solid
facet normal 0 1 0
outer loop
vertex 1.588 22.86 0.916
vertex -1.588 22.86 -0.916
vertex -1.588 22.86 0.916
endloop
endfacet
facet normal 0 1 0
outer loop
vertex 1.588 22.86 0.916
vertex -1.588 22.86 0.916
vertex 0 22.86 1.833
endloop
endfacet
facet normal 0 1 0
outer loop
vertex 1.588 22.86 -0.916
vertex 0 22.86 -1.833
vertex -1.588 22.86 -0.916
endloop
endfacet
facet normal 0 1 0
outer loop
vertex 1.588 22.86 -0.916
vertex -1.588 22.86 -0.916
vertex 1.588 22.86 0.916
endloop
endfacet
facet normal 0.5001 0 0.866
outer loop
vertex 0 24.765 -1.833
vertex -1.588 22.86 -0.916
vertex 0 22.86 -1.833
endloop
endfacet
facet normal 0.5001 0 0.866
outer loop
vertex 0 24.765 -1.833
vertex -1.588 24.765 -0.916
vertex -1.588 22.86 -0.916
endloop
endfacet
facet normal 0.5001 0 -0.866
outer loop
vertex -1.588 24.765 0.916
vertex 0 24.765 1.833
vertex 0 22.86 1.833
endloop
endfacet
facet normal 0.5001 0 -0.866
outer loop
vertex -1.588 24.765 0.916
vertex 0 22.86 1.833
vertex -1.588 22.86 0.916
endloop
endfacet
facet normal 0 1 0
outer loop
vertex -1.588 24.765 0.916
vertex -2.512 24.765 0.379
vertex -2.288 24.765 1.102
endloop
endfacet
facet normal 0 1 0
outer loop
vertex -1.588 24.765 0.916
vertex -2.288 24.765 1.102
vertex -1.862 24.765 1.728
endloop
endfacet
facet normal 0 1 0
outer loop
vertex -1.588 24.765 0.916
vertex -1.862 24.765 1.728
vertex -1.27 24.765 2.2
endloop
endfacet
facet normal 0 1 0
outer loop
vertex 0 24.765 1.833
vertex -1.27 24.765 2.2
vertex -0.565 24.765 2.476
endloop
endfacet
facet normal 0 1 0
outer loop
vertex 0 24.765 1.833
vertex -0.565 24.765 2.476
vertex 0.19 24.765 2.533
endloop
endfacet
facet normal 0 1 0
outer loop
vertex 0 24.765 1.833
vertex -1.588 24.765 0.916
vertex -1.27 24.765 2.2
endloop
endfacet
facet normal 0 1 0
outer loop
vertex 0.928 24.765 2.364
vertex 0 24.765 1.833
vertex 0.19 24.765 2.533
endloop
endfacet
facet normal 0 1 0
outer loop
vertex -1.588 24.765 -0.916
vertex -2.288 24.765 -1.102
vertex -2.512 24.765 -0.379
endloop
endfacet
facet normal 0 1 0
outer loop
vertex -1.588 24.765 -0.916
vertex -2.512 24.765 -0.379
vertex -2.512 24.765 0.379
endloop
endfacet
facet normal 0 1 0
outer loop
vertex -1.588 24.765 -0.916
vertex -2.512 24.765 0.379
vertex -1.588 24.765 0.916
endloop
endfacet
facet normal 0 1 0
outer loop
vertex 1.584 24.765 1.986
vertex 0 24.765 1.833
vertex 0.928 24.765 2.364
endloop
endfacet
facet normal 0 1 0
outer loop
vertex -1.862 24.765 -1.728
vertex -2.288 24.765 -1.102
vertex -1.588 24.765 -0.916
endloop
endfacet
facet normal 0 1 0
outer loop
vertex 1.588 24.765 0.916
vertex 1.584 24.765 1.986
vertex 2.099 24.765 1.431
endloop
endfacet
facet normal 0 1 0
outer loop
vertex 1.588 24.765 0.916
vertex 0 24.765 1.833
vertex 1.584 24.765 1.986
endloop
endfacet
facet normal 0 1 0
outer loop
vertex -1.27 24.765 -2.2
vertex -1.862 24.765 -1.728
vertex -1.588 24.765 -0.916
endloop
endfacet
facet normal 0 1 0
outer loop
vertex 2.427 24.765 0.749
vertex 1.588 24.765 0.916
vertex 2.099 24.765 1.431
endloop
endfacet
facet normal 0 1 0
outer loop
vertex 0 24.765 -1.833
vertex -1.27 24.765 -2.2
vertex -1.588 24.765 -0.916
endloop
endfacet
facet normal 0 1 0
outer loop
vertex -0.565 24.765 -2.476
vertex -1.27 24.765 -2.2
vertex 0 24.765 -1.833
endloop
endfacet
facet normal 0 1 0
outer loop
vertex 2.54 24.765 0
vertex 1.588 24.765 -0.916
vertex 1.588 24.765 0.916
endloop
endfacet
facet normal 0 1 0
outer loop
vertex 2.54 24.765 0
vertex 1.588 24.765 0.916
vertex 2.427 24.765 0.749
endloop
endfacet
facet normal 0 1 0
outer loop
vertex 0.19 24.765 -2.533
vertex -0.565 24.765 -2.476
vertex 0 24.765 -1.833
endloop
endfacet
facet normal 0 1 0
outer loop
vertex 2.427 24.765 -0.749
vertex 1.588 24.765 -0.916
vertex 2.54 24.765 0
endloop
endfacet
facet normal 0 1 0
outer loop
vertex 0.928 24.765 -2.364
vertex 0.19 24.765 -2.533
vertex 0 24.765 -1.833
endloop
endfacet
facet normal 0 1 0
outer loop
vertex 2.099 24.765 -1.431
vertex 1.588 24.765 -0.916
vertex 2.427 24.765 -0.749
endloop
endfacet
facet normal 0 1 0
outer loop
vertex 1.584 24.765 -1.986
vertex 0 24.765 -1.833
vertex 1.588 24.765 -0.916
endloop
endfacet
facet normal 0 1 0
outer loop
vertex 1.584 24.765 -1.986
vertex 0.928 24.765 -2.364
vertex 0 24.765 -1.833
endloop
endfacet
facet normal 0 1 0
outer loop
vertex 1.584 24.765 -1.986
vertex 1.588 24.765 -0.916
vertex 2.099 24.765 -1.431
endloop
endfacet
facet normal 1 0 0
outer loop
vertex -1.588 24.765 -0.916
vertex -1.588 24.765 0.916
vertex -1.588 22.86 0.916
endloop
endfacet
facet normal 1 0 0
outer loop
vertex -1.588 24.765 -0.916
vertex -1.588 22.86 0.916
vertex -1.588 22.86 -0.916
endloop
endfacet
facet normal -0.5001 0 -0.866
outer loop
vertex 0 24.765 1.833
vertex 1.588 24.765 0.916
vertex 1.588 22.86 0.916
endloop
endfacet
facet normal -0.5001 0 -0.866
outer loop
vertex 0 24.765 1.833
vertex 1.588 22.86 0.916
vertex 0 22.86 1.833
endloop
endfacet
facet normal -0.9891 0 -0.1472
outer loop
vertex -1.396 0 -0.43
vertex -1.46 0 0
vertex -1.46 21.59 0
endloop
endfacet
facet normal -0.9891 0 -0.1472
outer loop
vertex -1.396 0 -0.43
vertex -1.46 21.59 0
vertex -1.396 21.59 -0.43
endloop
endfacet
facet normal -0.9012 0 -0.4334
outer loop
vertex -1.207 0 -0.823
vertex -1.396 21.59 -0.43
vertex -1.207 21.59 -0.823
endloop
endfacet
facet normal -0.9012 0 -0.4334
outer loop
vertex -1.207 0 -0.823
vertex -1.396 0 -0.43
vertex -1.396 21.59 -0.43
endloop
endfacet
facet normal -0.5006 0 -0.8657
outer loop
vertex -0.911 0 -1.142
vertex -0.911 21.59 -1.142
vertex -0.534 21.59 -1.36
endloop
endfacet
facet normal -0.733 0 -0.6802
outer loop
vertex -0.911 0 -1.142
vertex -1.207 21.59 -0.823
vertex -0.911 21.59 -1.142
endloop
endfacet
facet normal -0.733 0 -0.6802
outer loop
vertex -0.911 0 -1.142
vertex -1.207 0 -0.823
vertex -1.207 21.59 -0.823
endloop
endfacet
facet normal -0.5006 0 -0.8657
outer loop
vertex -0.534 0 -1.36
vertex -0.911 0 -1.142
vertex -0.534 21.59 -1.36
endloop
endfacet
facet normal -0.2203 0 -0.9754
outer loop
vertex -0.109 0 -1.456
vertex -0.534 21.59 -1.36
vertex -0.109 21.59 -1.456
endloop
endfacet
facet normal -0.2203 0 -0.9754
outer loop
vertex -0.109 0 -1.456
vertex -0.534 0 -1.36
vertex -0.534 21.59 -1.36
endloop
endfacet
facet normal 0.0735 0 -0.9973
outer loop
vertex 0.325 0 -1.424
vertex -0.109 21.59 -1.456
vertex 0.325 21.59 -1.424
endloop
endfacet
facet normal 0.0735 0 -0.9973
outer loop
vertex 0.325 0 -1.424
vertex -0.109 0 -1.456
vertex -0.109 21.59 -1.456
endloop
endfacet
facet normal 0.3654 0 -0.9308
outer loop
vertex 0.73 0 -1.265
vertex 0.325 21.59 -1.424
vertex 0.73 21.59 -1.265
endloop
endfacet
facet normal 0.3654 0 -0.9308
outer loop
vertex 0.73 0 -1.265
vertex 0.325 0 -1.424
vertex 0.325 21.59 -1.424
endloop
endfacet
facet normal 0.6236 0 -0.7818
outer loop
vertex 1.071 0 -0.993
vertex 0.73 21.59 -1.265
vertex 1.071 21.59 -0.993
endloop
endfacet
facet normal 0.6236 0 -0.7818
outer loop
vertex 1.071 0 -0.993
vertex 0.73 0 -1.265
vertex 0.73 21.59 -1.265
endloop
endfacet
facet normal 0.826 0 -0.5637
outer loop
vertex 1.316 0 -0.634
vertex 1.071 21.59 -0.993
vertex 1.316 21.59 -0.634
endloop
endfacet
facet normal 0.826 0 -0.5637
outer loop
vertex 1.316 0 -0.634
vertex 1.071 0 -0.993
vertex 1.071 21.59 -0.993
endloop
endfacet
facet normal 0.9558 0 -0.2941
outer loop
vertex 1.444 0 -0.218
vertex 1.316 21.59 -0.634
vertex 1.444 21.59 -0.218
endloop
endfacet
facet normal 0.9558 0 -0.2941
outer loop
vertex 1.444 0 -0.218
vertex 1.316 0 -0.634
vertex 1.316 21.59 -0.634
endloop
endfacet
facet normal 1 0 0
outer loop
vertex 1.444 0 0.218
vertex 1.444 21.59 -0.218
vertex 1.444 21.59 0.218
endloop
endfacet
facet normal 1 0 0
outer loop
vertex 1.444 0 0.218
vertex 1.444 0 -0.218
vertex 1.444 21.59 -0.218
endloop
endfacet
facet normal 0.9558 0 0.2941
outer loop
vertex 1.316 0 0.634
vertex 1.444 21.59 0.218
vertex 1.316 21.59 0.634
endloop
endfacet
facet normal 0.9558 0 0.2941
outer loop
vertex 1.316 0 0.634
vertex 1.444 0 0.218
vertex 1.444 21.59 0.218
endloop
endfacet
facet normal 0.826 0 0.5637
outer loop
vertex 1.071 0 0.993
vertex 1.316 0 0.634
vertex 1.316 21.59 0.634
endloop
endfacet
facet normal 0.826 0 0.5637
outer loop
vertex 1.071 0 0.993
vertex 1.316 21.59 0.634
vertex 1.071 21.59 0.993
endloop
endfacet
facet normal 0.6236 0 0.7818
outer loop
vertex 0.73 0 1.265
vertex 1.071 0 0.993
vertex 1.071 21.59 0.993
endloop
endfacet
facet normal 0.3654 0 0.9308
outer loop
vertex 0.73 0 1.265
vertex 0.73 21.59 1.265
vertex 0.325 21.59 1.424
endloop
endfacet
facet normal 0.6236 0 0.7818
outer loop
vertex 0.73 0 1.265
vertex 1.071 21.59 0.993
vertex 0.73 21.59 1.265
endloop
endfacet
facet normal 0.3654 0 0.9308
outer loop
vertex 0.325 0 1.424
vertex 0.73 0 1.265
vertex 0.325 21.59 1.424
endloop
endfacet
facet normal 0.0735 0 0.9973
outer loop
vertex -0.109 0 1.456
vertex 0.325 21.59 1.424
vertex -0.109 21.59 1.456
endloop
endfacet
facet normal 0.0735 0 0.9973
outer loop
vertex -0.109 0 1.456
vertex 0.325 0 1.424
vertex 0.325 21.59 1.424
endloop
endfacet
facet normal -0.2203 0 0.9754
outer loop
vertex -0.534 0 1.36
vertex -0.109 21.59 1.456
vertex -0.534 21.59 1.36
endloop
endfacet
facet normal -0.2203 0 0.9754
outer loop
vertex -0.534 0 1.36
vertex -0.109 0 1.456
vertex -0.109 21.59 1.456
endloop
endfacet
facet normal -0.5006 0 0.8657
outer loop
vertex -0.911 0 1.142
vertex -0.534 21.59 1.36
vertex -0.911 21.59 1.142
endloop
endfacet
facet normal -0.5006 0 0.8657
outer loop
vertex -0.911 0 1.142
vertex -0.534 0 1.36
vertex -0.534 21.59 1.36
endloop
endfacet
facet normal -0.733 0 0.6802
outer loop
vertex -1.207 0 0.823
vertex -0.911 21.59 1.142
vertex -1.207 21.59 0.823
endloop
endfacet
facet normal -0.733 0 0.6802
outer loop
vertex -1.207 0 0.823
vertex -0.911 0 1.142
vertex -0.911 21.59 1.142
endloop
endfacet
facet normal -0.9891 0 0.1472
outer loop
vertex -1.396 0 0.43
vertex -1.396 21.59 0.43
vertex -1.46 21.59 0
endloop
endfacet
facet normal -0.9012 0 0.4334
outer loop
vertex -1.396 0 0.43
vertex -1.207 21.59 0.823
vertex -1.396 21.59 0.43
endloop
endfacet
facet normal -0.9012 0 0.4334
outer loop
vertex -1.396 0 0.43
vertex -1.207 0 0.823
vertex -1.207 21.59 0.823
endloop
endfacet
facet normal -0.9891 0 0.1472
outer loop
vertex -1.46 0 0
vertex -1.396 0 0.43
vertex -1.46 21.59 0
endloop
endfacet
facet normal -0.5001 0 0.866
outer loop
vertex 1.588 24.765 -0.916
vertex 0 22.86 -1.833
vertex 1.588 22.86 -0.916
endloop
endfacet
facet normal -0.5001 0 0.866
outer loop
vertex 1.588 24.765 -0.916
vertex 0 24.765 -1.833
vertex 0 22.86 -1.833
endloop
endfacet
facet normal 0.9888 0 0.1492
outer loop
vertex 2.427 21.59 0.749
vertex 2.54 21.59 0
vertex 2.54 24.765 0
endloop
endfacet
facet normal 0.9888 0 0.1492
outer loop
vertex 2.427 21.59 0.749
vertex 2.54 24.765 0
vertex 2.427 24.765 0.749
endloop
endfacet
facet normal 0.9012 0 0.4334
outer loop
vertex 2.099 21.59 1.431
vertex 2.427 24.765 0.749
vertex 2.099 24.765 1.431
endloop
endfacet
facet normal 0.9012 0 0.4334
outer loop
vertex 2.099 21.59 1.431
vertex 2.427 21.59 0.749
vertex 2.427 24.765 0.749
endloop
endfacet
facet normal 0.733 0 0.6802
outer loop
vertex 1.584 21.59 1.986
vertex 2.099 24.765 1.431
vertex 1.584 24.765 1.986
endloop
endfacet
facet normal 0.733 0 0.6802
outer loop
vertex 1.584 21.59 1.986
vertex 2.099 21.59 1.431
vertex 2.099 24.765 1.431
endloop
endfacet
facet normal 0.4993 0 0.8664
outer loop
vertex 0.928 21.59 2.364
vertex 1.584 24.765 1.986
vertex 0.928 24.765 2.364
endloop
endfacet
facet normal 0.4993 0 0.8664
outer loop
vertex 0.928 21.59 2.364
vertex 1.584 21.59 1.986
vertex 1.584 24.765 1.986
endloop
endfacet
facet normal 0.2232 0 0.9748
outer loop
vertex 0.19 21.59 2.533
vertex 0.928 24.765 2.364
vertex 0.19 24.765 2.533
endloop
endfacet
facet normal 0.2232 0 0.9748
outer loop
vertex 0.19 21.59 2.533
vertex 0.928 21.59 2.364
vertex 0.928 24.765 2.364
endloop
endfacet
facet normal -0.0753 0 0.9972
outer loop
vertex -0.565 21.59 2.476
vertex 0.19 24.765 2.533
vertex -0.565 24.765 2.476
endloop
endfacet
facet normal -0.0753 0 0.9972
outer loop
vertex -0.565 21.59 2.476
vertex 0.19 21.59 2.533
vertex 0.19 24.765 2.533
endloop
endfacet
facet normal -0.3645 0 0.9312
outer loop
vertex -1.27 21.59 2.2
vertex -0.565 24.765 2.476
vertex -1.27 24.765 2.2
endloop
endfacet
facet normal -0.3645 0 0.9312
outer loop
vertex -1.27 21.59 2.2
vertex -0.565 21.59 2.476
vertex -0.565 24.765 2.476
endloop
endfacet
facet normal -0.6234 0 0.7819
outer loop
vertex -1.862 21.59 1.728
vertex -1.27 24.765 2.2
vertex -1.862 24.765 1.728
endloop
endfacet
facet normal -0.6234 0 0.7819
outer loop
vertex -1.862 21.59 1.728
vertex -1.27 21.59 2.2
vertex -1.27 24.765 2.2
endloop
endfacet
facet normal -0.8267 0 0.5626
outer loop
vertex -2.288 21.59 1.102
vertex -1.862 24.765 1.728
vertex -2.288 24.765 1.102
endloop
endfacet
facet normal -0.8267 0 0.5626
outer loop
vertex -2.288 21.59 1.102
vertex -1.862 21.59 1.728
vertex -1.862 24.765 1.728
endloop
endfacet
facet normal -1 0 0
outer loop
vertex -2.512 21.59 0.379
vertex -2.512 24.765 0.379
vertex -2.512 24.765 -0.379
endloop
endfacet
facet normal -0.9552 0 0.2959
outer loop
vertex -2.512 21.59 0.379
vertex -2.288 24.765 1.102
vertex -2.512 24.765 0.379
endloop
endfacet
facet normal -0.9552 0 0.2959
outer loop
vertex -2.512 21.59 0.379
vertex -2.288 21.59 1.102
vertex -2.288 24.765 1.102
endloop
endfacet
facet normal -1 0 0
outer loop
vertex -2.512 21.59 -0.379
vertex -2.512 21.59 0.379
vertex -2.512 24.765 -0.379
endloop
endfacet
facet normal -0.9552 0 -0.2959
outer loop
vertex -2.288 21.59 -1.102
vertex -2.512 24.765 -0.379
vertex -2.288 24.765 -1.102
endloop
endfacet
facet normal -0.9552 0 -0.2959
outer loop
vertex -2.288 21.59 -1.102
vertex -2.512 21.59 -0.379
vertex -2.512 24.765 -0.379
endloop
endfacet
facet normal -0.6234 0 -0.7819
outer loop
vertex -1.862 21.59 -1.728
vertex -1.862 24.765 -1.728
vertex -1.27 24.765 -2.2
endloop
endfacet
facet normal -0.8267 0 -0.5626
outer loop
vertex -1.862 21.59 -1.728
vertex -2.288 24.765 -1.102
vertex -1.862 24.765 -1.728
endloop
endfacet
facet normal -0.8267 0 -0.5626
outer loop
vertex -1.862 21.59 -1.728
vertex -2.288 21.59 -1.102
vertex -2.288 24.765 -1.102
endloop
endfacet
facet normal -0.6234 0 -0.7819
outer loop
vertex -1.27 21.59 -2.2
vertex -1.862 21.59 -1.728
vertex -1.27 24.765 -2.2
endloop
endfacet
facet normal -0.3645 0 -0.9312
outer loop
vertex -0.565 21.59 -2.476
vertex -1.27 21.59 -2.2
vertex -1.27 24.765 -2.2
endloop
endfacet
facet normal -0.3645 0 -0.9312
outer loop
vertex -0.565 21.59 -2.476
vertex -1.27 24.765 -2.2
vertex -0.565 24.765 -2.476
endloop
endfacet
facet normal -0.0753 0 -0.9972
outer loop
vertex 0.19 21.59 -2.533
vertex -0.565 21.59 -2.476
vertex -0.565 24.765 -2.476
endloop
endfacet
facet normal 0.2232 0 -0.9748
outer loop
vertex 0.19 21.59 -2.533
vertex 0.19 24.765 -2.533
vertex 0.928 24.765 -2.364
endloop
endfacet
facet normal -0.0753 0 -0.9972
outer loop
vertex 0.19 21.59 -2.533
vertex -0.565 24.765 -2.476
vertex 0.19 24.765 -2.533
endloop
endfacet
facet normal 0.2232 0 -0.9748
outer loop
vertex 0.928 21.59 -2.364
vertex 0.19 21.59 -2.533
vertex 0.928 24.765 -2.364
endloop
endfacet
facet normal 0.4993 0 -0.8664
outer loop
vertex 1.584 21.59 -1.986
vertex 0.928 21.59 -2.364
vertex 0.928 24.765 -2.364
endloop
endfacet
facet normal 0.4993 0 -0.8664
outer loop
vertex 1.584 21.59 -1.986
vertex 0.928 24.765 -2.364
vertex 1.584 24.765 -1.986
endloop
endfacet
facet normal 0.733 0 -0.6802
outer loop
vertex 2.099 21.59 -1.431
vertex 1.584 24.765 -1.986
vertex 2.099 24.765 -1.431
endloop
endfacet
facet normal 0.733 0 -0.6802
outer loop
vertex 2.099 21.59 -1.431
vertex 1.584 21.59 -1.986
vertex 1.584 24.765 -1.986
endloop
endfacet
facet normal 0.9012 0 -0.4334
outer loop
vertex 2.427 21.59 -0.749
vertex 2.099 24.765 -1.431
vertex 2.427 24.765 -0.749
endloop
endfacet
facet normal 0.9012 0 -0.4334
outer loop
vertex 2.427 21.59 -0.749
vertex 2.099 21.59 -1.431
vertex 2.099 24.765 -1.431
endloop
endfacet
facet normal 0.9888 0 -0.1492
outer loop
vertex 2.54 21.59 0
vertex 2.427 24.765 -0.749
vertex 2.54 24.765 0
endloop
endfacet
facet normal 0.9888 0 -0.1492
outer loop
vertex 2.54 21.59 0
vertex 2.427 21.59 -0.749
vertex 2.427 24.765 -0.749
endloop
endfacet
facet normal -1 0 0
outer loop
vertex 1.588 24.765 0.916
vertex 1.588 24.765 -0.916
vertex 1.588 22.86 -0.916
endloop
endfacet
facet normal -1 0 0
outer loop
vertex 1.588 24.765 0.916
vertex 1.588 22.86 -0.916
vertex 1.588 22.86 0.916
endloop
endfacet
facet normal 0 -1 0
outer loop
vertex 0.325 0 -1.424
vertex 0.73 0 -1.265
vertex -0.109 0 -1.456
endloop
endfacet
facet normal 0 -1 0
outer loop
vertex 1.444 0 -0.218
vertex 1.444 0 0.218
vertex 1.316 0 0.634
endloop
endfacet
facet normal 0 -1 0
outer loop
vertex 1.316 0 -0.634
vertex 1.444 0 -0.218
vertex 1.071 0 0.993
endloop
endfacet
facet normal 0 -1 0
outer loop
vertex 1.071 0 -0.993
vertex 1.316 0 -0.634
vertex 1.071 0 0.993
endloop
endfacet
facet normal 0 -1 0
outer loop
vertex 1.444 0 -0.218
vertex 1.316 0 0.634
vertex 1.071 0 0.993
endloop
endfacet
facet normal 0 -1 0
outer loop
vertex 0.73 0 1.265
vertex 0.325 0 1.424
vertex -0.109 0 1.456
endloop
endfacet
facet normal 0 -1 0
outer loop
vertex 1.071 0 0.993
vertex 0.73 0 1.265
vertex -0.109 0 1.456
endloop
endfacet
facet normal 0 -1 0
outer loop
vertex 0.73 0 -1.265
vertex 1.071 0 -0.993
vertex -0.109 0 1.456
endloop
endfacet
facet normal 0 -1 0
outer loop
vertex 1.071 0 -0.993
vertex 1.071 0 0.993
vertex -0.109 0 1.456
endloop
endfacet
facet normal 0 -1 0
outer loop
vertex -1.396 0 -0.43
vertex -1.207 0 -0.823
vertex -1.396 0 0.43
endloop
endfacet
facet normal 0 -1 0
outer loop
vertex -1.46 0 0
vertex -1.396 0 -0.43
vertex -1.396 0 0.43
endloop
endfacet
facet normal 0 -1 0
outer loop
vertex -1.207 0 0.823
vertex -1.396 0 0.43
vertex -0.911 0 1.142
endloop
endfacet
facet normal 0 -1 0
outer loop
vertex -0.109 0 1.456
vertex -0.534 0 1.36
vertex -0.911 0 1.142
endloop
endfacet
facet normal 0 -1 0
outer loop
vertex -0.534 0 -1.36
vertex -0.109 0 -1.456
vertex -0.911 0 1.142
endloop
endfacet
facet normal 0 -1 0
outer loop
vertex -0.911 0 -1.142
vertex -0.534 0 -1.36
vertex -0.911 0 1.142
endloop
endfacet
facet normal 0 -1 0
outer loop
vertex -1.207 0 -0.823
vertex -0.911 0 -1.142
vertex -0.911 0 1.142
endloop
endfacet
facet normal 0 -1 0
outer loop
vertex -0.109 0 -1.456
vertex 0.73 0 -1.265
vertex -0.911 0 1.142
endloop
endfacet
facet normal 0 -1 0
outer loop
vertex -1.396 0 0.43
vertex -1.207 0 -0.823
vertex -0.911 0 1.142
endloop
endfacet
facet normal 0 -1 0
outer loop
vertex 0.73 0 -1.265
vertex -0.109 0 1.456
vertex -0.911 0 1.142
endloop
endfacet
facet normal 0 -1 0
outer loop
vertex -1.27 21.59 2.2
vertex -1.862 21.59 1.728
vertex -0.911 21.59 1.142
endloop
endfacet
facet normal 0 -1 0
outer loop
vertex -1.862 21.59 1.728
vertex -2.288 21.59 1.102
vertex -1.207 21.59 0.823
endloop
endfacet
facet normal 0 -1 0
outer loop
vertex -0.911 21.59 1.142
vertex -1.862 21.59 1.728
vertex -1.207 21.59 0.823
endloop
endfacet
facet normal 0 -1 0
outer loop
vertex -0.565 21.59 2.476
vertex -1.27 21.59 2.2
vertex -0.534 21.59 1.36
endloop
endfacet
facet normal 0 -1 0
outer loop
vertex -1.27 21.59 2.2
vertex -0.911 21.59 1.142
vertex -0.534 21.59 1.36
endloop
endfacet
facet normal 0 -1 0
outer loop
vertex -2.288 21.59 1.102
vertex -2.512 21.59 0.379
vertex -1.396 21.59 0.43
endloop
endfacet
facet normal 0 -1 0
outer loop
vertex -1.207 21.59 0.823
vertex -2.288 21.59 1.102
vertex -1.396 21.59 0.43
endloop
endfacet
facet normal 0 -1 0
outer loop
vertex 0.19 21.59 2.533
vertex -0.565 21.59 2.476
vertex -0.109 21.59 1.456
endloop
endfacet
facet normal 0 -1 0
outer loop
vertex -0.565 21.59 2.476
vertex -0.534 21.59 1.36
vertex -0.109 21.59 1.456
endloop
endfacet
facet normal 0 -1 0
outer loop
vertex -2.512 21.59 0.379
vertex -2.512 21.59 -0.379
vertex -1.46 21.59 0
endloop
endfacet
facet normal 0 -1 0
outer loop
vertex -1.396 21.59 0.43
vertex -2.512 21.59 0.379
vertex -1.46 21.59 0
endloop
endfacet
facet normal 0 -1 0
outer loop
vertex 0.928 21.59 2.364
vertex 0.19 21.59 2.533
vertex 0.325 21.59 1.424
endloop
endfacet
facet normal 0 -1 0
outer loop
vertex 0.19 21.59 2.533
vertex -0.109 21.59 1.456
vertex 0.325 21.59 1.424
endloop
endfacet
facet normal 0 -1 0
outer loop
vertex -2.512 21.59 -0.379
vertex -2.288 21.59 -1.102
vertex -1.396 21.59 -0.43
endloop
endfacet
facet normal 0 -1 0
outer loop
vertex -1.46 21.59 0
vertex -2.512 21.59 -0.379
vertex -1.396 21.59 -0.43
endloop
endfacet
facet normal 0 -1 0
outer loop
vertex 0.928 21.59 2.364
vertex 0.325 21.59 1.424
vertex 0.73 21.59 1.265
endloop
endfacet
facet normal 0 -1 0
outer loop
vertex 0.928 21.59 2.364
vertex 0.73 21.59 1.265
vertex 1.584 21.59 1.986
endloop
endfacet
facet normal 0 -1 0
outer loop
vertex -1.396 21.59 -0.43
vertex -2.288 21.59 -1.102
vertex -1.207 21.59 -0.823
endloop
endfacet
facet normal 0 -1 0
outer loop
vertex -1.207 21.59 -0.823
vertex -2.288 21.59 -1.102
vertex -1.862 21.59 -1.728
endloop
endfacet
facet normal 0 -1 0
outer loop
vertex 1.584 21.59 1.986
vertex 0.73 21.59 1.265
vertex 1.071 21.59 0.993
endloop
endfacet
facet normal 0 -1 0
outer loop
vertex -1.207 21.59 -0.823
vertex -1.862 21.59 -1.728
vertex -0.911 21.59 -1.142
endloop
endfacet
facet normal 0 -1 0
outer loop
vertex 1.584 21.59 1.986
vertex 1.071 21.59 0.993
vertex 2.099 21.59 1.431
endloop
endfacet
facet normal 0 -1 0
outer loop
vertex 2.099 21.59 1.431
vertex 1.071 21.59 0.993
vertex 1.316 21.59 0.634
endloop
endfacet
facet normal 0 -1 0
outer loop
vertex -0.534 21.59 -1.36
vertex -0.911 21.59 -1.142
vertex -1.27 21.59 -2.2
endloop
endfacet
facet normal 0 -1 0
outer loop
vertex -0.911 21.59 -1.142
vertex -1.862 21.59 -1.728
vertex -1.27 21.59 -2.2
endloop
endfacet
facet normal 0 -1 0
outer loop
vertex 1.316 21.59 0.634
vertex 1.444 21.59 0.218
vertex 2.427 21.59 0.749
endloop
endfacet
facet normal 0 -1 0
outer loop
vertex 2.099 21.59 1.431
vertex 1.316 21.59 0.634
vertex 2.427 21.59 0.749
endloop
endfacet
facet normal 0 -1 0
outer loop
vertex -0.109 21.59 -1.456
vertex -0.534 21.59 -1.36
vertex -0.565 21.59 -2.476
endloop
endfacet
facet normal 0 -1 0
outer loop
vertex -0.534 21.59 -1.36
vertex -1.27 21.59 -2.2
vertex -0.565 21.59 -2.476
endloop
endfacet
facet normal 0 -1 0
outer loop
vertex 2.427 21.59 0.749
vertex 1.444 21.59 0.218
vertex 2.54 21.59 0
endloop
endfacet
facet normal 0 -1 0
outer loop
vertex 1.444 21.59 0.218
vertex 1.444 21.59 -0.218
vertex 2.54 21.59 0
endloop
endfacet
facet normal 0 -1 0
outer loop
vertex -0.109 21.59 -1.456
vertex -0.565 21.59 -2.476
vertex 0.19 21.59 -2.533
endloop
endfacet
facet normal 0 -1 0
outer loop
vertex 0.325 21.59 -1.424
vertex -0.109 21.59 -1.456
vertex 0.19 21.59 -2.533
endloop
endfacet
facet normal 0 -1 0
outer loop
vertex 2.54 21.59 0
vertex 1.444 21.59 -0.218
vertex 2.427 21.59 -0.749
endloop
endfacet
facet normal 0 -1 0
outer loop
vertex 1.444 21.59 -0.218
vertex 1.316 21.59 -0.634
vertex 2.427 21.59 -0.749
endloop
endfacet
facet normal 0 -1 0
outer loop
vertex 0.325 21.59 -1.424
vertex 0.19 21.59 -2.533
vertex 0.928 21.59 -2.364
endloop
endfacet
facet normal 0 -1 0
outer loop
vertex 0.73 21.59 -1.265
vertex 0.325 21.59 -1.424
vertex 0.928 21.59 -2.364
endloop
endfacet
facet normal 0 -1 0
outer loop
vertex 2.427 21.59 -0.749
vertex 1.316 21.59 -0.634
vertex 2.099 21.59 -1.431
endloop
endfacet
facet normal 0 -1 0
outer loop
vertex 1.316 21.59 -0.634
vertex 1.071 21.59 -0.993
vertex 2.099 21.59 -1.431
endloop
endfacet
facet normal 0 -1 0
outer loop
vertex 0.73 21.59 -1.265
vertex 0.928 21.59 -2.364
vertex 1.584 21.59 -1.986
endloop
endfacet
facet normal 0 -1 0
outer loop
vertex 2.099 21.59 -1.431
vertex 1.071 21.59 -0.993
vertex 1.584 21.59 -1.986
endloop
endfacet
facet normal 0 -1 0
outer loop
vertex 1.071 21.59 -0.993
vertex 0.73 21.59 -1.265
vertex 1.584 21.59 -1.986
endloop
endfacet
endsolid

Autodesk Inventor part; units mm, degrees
ref_plane "YZ Plane" through (0, 0, 0) normal (1, 0, 0) x (0, 1, 0)
ref_plane "XZ Plane" through (0, 0, 0) normal (0, 1, 0) x (-1, 0, 0)
ref_plane "XY Plane" through (0, 0, 0) normal (0, 0, 1) x (1, 0, 0)
sketch "Sketch1" plane through (0, 0, 0) normal (0, 1, 0) x (-1, 0, 0)
  circle A0 centre (0, 0) radius 1.4605
  dimension "d0" = 2.921
extrude "Extrusion1" add sketch "Sketch1" along normal blind 21.59
sketch "Sketch2" plane through (0, 21.59, 0) normal (0, 1, 0) x (1, 0, 0)
  circle A0 centre (0, 0) radius 2.54
  dimension "d3" = 5.08
extrude "Extrusion2" add sketch "Sketch2" along normal blind 3.175
sketch "Sketch3" plane through (0, 24.765, 0) normal (0, 1, 0) x (1, 0, 0)
  line L0 (0, 1.8331) -> (1.5875, 0.9165)
  line L1 (1.5875, 0.9165) -> (1.5875, -0.9165)
  line L2 (1.5875, -0.9165) -> (0, -1.8331)
  line L3 (0, -1.8331) -> (-1.5875, -0.9165)
  line L4 (-1.5875, -0.9165) -> (-1.5875, 0.9165)
  line L5 (-1.5875, 0.9165) -> (0, 1.8331)
  point P0 (0, 0)
  point P1 (0, 0)
  dimension "d6" = 3.175
extrude "Extrusion3" cut sketch "Sketch3" against normal blind 1.905
thread "Thread1" size "5-40 UNC" class "2A" standard "ANSI Unified Screw Threads" length 34.29 offset 6.35
properties part number "Tube Rack bolt" material "Steel, Galvanized"
